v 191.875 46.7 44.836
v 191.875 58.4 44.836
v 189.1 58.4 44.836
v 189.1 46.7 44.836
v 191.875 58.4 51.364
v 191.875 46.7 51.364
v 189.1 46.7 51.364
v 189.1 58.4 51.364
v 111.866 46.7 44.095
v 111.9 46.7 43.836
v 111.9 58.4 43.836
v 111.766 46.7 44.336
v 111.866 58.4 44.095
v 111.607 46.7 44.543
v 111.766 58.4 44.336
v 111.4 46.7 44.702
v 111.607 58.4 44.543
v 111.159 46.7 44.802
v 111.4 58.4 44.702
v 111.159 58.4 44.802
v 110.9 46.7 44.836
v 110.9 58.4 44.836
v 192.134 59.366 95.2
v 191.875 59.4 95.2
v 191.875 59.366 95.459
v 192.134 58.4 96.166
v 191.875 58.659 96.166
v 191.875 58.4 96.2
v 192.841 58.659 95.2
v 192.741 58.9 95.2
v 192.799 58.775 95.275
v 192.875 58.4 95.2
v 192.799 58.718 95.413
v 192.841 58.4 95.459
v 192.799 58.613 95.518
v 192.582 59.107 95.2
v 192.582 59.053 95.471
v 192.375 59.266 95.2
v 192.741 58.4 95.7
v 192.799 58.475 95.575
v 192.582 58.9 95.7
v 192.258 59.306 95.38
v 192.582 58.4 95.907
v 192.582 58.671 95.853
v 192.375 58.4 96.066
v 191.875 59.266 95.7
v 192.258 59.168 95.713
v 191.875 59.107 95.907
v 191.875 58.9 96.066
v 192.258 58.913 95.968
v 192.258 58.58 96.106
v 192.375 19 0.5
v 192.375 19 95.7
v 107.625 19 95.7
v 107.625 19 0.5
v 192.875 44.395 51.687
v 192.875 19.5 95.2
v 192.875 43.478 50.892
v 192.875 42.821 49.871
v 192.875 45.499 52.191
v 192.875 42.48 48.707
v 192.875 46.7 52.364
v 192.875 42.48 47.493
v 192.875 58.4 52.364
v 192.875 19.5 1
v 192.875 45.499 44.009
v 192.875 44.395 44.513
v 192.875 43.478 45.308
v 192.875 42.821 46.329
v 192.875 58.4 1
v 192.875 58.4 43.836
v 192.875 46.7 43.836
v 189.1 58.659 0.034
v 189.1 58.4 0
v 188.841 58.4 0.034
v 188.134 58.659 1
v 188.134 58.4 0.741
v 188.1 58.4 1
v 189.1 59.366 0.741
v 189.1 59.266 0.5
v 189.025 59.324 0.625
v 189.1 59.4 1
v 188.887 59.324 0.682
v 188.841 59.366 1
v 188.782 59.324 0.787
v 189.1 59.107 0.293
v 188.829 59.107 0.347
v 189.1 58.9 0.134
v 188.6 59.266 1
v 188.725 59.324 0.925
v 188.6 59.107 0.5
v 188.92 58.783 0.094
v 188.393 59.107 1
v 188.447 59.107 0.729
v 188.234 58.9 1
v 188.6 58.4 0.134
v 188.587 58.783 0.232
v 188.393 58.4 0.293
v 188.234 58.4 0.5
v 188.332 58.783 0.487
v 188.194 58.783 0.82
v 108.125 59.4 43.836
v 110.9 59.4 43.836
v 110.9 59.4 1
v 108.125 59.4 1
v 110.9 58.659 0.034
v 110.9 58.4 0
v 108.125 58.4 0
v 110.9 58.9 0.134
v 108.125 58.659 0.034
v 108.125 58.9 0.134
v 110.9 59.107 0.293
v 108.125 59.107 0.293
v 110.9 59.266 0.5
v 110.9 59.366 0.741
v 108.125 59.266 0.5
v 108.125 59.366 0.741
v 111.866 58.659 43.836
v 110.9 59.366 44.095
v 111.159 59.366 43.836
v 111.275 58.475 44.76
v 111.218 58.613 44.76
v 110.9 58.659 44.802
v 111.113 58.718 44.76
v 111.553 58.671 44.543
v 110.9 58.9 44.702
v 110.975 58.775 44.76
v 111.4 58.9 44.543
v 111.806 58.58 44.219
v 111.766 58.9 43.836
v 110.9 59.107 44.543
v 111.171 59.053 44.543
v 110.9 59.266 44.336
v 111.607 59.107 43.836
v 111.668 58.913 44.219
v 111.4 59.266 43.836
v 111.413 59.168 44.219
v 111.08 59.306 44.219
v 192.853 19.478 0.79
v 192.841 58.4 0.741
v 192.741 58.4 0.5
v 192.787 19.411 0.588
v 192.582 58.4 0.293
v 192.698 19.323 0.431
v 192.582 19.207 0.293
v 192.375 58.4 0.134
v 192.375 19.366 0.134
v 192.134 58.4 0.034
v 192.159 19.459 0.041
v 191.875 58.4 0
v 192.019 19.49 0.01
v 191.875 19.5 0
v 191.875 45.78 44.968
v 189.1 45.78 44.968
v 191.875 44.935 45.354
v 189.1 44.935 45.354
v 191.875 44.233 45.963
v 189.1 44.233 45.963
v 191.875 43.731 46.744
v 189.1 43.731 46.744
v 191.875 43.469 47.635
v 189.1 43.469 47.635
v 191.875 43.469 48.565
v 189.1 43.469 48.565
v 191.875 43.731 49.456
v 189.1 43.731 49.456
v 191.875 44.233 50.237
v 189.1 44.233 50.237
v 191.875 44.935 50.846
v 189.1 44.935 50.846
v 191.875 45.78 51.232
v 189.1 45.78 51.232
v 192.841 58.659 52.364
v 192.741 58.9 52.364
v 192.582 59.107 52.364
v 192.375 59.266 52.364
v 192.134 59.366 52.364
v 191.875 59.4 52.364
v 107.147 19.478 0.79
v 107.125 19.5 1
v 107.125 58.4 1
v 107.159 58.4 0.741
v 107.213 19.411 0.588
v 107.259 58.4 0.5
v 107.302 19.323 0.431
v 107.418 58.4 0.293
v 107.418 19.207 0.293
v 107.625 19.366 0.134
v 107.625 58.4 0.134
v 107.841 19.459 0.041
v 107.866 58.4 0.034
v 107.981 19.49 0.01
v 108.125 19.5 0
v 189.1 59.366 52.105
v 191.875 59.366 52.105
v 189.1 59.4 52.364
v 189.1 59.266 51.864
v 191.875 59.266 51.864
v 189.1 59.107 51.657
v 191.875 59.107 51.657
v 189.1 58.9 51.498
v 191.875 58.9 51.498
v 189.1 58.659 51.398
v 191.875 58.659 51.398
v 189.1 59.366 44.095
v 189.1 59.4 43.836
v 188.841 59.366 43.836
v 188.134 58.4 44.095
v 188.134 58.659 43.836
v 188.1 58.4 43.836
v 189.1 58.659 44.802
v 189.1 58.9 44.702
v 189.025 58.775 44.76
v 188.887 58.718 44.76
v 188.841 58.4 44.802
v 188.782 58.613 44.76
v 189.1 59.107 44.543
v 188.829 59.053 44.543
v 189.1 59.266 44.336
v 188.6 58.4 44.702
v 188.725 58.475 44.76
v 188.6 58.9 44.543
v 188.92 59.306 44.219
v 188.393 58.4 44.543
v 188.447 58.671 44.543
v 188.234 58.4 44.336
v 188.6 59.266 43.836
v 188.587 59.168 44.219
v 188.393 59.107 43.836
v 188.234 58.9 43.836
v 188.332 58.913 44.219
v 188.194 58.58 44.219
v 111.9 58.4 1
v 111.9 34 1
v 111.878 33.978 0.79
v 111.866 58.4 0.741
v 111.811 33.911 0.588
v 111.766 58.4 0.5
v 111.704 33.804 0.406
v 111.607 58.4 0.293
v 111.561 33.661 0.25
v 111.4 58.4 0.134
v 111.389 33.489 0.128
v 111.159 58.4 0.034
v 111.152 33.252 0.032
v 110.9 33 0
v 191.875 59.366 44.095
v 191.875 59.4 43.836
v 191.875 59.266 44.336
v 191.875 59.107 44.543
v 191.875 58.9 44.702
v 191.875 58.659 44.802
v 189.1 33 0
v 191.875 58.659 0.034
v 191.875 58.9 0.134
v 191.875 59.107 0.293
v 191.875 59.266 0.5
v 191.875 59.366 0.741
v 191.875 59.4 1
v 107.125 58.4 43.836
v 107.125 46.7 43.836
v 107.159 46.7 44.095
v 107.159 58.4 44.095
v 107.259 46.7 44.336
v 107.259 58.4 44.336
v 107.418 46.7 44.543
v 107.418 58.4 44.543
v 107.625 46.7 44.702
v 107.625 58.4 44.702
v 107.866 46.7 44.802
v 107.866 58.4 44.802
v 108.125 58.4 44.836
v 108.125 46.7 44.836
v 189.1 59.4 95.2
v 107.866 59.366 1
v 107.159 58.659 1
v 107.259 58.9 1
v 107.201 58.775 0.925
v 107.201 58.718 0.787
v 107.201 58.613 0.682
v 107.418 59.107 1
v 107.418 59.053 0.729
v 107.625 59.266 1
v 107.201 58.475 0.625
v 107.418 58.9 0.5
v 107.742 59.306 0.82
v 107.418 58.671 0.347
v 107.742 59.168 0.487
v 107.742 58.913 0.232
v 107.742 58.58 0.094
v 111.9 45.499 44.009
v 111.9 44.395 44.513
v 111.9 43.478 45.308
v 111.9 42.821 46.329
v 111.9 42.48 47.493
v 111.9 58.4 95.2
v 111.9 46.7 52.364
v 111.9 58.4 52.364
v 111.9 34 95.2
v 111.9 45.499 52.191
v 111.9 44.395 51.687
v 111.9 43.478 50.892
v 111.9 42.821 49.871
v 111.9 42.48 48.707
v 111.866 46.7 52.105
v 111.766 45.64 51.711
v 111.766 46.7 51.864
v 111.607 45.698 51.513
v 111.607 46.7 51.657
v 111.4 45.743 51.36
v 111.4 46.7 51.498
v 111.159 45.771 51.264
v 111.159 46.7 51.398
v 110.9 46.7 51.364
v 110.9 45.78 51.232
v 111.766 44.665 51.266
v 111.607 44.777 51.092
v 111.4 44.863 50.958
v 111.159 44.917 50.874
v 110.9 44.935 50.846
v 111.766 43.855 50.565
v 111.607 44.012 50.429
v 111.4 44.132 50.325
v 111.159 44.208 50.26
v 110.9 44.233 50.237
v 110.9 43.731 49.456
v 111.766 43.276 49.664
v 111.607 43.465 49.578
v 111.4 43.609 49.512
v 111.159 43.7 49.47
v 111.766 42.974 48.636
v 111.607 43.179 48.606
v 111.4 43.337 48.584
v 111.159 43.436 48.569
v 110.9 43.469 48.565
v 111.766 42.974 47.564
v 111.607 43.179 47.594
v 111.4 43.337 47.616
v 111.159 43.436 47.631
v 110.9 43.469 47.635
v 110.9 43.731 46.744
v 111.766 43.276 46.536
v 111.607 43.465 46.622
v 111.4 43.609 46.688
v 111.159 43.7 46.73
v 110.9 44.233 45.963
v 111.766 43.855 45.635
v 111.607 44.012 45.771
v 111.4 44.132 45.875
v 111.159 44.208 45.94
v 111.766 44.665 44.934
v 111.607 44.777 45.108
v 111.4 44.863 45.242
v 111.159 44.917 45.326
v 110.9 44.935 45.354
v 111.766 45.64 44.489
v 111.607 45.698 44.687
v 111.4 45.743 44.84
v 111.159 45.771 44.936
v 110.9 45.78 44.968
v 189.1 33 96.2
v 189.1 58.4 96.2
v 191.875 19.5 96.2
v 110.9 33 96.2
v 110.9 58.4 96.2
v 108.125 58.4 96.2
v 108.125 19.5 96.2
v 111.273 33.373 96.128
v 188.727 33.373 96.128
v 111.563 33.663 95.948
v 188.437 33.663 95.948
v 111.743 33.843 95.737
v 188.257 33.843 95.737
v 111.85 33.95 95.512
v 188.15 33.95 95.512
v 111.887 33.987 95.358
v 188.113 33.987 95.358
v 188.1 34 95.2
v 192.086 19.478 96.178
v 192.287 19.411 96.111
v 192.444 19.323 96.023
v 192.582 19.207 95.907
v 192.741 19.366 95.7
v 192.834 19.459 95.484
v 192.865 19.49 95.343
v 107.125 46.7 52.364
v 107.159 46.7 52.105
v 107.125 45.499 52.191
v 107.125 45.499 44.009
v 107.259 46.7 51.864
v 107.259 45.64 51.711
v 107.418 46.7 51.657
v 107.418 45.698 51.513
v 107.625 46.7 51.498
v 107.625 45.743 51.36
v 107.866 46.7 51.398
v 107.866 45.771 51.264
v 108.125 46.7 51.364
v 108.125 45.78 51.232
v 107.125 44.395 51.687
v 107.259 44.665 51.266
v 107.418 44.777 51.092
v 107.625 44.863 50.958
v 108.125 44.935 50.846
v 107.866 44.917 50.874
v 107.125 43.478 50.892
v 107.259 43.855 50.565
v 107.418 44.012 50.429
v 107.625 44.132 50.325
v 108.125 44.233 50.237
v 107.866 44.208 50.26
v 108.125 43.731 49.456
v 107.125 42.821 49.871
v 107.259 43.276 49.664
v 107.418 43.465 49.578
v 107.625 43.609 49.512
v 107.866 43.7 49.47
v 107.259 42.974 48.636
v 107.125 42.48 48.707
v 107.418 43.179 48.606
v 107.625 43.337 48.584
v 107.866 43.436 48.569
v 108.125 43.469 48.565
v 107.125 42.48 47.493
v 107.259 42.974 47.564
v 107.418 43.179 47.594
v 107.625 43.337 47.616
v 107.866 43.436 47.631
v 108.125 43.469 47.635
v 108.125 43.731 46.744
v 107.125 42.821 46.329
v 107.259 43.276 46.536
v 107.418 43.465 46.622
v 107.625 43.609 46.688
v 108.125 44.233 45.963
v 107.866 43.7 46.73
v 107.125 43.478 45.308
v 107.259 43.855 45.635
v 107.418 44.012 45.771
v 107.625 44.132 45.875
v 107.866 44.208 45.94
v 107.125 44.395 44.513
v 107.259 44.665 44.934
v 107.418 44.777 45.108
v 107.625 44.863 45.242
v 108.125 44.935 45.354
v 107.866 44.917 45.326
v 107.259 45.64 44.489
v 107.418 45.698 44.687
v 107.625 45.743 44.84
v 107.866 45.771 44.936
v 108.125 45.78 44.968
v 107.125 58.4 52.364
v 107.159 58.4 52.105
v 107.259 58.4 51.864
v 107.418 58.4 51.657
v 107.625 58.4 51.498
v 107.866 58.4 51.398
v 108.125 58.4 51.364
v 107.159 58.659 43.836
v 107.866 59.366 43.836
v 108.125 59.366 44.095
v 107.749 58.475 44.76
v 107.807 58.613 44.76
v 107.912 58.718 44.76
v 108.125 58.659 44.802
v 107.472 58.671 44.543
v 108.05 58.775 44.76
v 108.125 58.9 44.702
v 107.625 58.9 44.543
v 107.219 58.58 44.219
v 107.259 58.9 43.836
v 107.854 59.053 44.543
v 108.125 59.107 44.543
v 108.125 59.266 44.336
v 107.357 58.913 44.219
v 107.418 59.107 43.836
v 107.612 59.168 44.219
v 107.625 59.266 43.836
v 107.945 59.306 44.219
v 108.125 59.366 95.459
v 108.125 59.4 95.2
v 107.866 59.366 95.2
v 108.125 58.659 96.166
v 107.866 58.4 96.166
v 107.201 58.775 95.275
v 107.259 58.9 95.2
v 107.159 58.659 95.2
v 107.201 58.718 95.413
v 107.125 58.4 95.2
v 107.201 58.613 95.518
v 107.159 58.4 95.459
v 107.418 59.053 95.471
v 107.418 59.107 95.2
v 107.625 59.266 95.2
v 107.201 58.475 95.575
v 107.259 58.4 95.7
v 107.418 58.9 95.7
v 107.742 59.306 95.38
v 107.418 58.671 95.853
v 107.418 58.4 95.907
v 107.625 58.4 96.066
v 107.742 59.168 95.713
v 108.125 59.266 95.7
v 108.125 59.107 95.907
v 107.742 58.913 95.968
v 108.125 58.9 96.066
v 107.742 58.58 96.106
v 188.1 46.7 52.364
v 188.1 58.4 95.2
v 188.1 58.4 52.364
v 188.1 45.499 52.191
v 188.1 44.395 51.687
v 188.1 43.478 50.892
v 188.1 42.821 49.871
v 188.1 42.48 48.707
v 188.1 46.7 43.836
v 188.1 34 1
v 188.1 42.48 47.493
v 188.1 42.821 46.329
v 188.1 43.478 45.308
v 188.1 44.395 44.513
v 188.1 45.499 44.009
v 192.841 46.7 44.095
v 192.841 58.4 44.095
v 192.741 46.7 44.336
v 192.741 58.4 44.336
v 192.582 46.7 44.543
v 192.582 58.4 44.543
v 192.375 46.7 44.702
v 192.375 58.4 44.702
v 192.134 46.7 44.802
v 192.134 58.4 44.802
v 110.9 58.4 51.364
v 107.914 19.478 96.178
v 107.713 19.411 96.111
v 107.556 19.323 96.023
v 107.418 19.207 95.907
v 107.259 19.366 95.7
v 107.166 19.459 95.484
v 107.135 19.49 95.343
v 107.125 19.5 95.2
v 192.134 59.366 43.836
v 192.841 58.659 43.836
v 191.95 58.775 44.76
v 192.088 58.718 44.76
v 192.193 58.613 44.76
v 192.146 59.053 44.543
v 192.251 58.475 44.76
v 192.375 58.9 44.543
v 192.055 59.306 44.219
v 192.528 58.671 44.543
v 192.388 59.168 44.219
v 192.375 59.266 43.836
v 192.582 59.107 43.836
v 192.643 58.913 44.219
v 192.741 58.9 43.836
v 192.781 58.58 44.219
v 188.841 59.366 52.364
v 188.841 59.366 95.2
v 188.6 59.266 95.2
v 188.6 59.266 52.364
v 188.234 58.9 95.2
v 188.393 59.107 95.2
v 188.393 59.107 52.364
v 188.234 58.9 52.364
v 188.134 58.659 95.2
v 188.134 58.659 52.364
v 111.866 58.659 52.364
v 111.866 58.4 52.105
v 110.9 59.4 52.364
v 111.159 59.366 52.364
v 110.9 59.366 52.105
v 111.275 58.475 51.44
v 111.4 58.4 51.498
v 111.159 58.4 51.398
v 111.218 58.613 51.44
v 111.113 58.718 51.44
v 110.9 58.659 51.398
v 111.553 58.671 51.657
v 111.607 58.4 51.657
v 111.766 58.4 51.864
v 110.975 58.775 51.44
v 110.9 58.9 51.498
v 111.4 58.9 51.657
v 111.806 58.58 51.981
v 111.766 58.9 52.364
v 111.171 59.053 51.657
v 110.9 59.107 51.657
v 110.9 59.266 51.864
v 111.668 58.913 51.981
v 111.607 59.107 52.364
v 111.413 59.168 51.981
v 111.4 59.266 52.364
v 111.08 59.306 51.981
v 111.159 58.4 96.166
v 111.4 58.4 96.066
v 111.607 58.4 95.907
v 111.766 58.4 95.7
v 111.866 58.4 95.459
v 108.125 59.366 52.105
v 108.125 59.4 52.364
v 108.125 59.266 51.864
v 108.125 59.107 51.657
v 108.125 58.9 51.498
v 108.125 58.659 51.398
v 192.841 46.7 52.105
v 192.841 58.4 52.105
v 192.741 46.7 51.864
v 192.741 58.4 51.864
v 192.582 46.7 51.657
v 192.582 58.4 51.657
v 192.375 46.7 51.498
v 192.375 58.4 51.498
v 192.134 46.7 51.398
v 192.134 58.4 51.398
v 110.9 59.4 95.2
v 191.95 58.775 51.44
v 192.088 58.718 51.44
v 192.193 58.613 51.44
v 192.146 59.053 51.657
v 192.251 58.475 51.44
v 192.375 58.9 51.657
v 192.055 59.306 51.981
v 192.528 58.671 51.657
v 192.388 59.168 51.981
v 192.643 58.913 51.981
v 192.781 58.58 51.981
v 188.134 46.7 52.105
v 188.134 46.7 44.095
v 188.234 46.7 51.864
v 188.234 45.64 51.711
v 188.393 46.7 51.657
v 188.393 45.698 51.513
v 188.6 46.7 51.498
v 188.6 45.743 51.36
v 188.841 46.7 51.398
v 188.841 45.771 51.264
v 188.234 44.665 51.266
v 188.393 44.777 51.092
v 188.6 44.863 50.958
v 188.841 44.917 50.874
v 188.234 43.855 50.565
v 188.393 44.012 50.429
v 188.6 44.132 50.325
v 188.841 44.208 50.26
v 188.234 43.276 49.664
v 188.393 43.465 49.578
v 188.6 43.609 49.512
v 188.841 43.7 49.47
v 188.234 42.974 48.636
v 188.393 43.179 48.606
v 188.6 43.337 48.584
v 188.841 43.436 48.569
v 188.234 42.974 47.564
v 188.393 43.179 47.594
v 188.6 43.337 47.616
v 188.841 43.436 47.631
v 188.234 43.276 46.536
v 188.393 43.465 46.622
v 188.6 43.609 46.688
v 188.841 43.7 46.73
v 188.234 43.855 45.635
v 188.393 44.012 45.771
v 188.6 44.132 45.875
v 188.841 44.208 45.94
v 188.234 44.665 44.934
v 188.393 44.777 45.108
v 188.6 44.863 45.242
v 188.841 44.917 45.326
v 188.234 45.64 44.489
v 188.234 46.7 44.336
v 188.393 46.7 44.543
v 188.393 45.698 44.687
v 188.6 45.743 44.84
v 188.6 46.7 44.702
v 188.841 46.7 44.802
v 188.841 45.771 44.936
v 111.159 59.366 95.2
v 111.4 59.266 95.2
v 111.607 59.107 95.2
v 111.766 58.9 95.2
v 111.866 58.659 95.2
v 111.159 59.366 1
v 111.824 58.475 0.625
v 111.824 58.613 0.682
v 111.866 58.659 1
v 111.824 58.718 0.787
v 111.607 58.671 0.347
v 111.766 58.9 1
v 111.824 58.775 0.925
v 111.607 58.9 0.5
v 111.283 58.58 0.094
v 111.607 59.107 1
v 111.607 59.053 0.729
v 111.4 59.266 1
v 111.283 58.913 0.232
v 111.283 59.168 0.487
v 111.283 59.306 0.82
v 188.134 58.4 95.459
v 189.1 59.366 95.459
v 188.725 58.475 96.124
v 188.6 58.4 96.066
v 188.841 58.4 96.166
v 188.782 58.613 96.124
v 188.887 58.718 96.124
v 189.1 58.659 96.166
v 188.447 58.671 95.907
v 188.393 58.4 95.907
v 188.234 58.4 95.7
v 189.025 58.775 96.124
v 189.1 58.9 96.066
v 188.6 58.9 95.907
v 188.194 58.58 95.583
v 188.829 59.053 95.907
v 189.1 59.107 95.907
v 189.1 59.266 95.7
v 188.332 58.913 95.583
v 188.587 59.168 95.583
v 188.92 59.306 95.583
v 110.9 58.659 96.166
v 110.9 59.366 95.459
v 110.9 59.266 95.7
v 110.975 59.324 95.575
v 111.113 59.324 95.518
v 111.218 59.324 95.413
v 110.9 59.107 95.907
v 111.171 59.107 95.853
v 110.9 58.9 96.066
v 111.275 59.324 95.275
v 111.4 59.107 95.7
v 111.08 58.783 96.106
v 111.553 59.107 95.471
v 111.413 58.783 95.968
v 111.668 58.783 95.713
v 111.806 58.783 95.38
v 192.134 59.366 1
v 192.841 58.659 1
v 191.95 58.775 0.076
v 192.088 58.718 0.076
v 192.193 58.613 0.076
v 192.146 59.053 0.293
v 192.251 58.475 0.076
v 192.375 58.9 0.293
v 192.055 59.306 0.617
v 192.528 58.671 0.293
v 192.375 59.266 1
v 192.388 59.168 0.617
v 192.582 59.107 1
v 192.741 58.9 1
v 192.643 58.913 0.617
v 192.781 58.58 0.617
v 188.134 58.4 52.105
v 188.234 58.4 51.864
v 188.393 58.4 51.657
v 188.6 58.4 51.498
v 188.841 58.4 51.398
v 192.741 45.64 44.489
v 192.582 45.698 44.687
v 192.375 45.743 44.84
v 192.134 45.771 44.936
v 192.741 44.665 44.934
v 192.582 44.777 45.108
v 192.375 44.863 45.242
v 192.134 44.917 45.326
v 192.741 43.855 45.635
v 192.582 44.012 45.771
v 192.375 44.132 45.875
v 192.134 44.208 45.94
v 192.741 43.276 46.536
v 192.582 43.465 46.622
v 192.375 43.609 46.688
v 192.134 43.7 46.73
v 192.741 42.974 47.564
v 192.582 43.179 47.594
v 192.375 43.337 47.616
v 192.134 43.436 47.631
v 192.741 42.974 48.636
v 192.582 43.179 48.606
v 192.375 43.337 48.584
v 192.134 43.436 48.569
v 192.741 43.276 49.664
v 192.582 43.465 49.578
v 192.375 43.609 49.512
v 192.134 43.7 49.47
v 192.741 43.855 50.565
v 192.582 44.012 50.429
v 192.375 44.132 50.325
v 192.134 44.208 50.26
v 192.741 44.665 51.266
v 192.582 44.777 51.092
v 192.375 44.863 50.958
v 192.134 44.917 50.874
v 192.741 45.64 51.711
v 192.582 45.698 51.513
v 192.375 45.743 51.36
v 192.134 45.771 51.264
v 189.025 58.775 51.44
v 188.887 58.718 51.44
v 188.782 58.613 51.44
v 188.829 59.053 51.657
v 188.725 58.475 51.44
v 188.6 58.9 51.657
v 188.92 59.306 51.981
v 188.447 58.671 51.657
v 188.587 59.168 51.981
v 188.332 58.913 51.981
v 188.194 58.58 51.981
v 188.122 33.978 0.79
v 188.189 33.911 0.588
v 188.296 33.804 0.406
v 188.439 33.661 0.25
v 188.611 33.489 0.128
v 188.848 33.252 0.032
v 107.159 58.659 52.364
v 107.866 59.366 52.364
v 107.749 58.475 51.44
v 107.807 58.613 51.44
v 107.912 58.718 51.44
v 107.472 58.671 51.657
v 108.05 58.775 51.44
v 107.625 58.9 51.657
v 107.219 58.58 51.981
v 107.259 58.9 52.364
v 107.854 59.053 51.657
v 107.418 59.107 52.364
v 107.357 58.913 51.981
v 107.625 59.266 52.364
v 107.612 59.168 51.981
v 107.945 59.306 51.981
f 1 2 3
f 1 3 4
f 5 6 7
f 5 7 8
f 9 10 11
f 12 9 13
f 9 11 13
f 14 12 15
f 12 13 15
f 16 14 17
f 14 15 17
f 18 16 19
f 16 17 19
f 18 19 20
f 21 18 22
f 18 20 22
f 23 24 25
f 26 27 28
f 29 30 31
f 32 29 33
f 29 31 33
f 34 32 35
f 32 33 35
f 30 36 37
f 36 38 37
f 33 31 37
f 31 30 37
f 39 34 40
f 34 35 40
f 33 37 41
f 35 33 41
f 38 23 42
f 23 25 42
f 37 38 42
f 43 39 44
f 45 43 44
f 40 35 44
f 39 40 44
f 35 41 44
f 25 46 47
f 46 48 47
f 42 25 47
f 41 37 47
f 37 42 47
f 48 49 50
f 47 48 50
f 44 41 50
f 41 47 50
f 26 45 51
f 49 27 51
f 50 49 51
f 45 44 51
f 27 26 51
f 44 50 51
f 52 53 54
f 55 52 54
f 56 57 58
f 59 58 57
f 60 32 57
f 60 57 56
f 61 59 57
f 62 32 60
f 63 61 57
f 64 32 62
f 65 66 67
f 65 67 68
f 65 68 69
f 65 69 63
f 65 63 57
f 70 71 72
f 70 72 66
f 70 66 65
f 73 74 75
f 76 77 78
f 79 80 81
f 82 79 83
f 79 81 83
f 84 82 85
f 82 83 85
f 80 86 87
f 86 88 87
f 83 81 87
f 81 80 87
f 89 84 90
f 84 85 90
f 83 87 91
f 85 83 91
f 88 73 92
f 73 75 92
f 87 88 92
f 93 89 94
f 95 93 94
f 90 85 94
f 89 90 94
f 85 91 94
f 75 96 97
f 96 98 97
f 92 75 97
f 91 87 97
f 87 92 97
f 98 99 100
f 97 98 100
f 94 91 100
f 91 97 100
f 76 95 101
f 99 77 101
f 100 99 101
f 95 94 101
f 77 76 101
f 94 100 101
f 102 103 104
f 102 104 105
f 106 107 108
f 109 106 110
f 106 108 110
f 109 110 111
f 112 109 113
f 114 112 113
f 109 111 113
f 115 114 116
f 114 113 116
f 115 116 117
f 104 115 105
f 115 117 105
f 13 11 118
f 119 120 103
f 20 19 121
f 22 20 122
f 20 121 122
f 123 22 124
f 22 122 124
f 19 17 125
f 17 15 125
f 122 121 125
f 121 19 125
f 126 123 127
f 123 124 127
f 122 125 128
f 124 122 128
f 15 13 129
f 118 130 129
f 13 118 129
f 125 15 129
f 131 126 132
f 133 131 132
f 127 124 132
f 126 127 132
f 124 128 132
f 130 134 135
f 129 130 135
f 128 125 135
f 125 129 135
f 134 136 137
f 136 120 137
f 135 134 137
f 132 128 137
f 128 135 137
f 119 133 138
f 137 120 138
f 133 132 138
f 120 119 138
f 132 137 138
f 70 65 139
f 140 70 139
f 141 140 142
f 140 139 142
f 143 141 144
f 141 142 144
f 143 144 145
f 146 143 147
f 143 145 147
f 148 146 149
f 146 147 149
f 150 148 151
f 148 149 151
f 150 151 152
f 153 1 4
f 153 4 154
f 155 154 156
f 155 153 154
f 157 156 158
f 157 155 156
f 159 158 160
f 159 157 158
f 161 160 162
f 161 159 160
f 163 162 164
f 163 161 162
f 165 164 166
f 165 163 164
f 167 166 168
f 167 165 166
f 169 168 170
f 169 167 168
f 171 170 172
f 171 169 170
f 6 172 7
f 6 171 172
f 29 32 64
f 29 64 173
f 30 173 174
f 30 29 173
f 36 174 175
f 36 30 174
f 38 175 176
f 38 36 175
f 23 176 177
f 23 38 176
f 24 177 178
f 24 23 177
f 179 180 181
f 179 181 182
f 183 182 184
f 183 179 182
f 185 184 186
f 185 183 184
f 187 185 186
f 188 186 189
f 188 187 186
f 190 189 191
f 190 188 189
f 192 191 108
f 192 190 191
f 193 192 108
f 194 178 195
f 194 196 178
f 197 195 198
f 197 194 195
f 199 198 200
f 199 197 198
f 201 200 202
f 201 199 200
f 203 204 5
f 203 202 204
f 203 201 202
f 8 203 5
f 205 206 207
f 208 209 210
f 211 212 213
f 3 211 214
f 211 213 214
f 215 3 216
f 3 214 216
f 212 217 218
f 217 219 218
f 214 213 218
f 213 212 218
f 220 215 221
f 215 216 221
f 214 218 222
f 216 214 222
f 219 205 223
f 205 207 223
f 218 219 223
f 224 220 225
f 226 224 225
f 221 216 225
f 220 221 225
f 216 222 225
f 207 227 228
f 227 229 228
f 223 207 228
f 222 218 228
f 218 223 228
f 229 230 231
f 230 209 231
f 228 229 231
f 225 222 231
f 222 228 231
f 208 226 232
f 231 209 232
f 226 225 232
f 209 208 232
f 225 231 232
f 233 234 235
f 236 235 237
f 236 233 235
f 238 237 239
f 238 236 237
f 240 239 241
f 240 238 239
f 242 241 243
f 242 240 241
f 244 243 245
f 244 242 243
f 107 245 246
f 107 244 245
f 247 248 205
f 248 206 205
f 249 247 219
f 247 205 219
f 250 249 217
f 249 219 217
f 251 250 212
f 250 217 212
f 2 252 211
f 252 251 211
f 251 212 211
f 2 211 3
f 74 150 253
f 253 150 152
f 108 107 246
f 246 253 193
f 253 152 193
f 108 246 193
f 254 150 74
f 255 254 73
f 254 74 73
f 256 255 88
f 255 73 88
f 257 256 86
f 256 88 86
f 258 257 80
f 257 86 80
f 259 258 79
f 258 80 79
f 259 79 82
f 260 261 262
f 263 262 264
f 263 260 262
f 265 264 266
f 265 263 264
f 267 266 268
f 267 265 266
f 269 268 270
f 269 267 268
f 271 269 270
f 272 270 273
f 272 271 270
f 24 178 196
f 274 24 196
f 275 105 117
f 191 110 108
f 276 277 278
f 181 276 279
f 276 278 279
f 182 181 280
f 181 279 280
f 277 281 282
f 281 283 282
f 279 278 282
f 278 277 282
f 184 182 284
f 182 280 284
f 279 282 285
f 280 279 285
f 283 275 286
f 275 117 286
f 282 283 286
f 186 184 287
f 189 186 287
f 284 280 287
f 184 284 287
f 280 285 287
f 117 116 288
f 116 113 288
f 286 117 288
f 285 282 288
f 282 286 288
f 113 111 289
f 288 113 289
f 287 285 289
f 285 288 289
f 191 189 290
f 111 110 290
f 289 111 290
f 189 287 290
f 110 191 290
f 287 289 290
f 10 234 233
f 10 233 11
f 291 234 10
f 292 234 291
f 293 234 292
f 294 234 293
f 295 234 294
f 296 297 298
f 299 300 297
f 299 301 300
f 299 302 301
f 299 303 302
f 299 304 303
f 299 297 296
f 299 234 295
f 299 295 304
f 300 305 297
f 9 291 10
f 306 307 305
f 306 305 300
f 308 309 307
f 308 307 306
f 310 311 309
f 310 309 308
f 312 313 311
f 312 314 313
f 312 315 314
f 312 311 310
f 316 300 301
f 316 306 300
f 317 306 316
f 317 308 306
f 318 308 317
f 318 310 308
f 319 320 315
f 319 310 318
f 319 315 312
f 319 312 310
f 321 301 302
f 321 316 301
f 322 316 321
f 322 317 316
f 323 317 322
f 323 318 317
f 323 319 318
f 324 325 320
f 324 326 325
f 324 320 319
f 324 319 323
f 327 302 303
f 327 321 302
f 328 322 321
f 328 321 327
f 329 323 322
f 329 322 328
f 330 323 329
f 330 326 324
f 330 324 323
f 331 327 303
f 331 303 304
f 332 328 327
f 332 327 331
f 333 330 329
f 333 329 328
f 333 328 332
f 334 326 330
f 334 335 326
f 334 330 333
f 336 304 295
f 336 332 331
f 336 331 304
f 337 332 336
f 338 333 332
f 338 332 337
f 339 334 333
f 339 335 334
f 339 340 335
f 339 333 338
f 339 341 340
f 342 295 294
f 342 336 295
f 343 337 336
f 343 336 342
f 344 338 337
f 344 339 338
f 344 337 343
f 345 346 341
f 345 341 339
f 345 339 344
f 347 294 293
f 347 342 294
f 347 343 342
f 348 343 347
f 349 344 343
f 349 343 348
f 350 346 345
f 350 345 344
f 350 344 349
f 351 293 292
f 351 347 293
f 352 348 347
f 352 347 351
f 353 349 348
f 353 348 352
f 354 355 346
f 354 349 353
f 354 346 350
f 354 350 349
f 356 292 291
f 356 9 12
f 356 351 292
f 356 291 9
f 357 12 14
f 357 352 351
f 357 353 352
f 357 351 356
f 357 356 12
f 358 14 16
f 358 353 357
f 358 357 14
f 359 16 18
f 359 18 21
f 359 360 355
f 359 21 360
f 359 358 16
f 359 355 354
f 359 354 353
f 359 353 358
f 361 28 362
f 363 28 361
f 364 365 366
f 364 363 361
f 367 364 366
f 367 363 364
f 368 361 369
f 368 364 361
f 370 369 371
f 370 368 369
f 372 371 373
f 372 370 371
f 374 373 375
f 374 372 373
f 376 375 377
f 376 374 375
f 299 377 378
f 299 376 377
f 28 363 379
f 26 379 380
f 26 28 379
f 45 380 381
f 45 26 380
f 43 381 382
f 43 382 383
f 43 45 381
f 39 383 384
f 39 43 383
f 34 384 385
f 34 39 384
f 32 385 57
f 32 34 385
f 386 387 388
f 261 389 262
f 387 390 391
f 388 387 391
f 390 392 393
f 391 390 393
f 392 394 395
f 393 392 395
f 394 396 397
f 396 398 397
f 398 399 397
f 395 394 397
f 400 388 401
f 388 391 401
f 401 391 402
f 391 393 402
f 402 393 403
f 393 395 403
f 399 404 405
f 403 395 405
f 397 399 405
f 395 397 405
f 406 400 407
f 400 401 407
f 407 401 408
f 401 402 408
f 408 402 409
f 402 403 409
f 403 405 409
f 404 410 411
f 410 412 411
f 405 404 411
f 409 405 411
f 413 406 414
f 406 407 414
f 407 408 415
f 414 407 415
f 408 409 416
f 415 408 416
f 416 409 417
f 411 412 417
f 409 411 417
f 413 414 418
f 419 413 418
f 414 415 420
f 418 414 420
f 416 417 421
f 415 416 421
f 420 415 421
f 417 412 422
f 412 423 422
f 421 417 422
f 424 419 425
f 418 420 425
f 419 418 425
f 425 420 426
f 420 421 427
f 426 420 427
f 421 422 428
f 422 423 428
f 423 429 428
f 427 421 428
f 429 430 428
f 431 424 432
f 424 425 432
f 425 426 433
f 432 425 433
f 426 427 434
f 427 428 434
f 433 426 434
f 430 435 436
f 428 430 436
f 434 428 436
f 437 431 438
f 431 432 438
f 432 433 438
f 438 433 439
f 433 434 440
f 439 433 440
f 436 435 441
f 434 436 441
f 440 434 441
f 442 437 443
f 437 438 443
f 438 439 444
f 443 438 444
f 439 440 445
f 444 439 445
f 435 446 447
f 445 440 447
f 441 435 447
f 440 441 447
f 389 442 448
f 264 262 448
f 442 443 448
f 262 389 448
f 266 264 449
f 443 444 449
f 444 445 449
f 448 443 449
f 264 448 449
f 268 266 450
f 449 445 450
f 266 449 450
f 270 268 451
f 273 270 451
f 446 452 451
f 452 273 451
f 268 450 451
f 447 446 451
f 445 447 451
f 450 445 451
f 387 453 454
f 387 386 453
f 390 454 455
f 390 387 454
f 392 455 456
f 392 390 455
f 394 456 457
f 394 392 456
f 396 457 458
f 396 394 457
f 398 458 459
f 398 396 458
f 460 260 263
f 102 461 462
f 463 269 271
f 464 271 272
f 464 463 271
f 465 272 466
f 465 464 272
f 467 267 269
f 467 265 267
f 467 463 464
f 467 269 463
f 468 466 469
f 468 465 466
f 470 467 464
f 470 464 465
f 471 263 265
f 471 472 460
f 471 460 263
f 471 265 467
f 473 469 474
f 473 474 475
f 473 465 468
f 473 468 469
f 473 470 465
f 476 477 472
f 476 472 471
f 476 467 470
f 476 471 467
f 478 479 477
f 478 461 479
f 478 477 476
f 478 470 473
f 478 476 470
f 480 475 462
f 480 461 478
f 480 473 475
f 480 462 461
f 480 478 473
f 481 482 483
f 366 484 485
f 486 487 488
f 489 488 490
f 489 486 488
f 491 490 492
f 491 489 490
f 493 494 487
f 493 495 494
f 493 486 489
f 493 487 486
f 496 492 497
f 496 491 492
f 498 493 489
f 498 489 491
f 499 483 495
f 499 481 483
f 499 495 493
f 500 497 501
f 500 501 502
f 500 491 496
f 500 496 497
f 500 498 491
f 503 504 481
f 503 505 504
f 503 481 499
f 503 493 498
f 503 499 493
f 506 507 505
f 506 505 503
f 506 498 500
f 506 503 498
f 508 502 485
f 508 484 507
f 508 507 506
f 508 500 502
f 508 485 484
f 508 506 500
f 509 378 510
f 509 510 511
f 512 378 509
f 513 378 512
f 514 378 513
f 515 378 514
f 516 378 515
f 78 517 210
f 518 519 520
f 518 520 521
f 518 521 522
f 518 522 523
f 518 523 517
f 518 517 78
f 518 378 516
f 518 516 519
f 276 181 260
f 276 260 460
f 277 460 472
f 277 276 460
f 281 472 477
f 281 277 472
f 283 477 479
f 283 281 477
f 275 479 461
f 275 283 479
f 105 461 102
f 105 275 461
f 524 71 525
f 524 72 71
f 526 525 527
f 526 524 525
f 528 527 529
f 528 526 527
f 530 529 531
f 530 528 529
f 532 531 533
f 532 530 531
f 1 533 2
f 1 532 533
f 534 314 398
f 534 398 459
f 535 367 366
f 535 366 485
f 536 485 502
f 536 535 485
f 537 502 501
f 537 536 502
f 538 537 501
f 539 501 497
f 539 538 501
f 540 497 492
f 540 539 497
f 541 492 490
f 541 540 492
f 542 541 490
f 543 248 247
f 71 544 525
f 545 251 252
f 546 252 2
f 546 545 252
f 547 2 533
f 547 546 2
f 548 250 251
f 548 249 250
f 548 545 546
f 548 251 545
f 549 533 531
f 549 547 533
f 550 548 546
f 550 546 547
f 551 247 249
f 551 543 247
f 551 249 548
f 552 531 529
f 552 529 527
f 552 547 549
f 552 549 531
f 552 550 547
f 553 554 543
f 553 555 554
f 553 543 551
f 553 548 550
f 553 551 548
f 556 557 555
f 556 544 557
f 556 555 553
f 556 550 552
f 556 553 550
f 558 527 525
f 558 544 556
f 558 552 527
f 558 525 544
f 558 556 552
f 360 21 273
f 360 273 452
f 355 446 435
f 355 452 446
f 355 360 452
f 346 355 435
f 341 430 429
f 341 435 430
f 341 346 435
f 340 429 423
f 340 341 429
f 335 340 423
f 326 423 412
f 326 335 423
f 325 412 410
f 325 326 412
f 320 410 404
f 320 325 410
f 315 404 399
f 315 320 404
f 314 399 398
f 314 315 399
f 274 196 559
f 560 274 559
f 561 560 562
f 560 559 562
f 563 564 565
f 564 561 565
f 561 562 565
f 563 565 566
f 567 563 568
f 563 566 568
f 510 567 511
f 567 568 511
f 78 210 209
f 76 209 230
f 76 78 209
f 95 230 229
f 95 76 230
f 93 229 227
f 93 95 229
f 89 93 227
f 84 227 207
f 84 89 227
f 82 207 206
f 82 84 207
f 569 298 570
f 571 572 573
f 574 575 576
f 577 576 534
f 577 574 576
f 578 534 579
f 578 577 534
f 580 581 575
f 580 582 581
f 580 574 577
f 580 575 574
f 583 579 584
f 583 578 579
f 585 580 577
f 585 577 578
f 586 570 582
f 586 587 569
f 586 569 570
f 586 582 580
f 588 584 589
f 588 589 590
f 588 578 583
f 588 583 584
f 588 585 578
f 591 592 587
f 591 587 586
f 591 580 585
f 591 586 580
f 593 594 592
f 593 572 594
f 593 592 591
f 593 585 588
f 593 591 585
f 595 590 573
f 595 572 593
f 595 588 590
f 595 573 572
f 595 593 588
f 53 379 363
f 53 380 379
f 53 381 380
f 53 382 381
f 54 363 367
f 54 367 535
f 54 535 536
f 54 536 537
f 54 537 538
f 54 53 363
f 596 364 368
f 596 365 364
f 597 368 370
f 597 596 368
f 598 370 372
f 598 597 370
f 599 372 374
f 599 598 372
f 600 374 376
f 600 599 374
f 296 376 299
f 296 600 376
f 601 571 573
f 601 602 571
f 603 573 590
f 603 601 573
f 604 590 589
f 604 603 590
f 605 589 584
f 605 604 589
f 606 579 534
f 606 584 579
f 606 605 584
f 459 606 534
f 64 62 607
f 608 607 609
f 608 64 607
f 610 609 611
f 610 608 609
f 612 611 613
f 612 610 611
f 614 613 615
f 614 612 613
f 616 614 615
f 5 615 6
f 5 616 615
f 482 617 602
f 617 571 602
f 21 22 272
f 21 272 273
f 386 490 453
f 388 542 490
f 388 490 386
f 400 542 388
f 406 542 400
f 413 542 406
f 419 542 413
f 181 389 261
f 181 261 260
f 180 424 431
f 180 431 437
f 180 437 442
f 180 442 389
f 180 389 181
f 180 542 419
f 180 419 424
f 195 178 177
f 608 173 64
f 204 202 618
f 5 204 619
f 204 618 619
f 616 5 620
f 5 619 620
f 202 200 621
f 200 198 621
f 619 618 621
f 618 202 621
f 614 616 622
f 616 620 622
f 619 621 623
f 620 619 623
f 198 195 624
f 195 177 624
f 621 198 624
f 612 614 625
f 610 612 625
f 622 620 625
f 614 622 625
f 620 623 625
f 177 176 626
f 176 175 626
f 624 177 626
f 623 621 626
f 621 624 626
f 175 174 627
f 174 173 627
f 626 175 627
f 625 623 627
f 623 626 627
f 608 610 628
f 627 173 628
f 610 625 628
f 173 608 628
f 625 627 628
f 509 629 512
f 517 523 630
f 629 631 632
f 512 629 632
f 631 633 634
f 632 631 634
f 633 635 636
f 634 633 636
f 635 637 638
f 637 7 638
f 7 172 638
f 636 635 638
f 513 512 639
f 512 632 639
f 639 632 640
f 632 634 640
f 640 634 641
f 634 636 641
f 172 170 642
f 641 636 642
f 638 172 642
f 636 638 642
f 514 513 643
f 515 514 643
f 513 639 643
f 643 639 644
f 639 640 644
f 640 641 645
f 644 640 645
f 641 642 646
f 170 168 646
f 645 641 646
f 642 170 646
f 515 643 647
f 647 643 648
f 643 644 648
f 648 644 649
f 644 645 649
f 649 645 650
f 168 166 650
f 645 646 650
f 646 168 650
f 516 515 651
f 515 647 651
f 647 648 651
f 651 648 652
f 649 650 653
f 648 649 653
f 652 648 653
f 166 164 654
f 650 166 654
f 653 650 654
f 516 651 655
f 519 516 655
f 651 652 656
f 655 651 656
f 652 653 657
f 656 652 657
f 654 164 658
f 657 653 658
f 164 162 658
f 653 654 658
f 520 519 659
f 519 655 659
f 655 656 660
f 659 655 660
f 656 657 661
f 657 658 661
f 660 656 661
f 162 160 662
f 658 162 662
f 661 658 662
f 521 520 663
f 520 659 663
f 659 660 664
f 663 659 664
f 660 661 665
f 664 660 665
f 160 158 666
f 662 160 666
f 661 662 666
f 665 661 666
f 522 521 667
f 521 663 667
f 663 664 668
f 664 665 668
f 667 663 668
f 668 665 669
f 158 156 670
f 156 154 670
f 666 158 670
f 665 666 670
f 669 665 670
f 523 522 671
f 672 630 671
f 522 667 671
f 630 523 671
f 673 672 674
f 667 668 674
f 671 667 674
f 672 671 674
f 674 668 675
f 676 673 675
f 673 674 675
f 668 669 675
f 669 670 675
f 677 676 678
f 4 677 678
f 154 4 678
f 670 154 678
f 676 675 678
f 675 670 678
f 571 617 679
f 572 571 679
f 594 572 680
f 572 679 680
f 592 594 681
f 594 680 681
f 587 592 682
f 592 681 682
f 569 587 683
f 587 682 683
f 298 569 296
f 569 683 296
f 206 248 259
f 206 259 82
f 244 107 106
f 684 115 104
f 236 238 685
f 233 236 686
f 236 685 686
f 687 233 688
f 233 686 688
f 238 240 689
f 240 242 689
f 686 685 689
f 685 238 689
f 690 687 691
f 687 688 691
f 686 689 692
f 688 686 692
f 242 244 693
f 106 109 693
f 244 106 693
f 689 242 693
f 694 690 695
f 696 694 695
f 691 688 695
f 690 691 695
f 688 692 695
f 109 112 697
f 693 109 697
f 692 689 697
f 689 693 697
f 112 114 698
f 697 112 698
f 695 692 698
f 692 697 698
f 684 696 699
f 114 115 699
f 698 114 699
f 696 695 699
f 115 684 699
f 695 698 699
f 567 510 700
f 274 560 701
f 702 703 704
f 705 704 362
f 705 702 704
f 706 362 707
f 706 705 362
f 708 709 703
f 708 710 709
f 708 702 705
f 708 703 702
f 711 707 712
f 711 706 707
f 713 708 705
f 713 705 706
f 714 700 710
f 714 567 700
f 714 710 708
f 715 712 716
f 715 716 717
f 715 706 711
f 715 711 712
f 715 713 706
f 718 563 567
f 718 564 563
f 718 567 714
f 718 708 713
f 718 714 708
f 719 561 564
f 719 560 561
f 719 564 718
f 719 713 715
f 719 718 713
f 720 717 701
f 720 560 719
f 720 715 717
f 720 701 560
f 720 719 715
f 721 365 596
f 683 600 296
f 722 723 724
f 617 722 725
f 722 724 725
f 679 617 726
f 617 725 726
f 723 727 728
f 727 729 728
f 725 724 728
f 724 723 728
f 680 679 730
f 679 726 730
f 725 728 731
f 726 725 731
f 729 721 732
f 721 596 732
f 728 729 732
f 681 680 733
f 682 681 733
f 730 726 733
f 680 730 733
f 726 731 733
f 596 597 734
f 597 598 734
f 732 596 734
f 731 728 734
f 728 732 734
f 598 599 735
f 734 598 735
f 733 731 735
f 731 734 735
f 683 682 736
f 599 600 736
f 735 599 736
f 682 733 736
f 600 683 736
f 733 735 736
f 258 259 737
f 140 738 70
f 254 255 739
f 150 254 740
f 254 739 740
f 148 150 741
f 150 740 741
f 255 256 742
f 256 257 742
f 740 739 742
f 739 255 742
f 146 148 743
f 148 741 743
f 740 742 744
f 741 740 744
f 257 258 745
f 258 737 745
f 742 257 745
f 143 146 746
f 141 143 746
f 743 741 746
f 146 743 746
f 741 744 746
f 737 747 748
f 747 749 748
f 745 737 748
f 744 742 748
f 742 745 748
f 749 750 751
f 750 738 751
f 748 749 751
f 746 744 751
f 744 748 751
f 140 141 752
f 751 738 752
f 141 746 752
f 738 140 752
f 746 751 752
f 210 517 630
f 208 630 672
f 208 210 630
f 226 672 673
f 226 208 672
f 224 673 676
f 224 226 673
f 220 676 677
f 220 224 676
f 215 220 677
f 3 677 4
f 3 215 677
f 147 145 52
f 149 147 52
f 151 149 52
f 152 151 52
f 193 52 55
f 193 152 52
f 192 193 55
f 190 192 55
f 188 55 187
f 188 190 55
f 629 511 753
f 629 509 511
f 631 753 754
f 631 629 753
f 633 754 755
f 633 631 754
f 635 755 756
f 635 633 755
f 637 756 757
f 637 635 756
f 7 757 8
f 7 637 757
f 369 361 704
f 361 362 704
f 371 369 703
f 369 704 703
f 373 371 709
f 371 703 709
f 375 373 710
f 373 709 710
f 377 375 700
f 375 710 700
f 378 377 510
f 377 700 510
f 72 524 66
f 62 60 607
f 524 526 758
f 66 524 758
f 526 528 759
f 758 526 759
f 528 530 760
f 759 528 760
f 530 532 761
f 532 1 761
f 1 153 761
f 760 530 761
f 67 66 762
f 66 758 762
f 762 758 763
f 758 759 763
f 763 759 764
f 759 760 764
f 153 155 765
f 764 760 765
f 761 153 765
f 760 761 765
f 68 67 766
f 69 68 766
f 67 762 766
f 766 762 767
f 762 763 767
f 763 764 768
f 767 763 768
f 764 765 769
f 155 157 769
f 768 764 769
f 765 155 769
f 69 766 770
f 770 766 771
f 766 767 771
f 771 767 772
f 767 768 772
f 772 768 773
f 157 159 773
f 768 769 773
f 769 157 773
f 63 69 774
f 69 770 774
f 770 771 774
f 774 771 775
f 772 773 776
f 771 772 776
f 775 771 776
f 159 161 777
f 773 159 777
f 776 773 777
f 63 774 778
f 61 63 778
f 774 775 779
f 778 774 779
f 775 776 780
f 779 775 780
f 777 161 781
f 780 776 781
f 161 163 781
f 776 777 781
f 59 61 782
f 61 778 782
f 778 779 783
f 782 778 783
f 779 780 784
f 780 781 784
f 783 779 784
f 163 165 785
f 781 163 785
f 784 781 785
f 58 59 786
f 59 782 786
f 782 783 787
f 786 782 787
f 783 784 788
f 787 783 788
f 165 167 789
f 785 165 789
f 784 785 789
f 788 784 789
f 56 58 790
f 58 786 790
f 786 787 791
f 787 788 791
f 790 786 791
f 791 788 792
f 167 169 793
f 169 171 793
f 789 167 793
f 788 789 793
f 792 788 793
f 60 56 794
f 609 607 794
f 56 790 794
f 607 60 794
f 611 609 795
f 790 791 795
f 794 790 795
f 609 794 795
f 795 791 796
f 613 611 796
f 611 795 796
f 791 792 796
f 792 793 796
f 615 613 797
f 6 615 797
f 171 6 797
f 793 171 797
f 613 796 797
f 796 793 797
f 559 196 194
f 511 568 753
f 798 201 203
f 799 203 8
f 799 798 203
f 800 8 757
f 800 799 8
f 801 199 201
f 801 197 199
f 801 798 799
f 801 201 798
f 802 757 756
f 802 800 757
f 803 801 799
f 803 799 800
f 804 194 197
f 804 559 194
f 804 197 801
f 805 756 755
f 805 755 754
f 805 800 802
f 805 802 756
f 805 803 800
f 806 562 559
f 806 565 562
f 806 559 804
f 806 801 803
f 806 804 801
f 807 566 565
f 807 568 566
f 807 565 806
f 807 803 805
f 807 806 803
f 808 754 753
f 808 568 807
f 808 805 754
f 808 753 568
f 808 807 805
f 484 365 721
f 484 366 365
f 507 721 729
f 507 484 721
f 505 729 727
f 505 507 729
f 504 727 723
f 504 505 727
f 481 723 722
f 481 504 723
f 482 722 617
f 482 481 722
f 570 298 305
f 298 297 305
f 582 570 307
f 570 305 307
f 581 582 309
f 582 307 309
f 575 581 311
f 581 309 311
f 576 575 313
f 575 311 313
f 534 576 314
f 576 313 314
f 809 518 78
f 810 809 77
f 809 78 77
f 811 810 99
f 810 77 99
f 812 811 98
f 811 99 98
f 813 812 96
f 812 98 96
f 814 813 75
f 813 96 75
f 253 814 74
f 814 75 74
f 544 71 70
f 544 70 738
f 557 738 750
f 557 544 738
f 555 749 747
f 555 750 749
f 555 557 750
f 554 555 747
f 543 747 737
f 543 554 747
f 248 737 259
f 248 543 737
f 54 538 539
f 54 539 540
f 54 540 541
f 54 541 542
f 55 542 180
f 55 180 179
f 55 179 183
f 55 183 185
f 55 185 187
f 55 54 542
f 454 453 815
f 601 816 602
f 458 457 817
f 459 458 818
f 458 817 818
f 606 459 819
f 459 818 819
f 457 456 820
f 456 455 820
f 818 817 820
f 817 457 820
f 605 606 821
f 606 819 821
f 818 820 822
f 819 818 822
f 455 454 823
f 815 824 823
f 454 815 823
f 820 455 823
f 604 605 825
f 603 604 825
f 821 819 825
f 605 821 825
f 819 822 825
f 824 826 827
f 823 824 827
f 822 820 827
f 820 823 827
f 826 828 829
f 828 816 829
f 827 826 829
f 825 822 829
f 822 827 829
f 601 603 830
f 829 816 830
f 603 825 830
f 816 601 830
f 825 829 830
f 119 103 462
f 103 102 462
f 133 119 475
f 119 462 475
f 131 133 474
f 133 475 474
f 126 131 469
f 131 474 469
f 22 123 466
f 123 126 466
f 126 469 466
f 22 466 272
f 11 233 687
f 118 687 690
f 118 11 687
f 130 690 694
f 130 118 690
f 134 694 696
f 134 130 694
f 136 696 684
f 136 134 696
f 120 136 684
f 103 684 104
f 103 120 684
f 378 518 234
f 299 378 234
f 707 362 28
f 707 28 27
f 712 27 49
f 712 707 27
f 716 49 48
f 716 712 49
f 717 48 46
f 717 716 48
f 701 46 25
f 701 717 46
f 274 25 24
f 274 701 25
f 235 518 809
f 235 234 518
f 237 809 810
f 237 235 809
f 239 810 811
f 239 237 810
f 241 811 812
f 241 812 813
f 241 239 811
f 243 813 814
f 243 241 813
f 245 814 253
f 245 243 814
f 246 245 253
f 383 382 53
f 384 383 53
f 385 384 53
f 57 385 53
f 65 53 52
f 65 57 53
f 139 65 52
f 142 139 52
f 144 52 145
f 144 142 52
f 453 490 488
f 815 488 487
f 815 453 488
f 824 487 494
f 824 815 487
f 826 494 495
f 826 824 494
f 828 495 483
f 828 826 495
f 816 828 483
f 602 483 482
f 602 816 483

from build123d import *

# Parameters (mm, degrees)
SKETCH2_W           = 85.7504
SKETCH2_H           = 96.2
BOSS_EXTRUDE1_DEPTH = 15
SKETCH2_3_W         = 4.7752
SKETCH2_3_H         = 96.2
BOSS_EXTRUDE2_DEPTH = 25.4
CUT_EXTRUDE1_DEPTH  = 142.901131427
CHAMFER1_SIZE       = 0.5
FILLET2_R           = 1


with BuildPart() as part:
    # Sketch2 → Boss-Extrude1 (new body)
    with BuildSketch(Plane(origin=(0, 34, 0), x_dir=(-1, 0, 0), z_dir=(0, -1, 0))):
        with Locations((-150, -48.1)):
            Rectangle(SKETCH2_W, SKETCH2_H)
    extrude(amount=BOSS_EXTRUDE1_DEPTH)

    # Sketch2<3> → Boss-Extrude2 (add)
    with BuildSketch(Plane(origin=(0, 34, 0), x_dir=(-1, 0, 0), z_dir=(0, -1, 0))):
        with Locations((-109.5124, -48.1)):
            Rectangle(SKETCH2_3_W, SKETCH2_3_H)
        with Locations((-190.4876, -48.1)):
            Rectangle(SKETCH2_3_W, SKETCH2_3_H)
    extrude(amount=-BOSS_EXTRUDE2_DEPTH)

    # Sketch3 → Cut-Extrude1 (cut, through all)
    with BuildSketch(Plane(origin=(192.8752, 0, 0), x_dir=(0, 0, -1), z_dir=(1, 0, 0))):
        with BuildLine():
            Line((-51.3639, 46.7), (-51.3639, 59.4))
            Line((-51.3639, 59.4), (-44.8361, 59.4))
            Line((-44.8361, 59.4), (-44.8361, 46.7))
            ThreePointArc((-44.8361, 46.7), (-48.1, 43.4361), (-51.3639, 46.7))
        make_face()
    extrude(amount=-CUT_EXTRUDE1_DEPTH, mode=Mode.SUBTRACT)

    # Chamfer1
    chamfer1_edges = [part.edges().sort_by_distance(p)[0] for p in [
        (150, 19, 96.2),
        (192.8752, 19, 48.1),
        (150, 19, 0),
        (107.1248, 19, 48.1),
    ]]
    chamfer(chamfer1_edges, length=CHAMFER1_SIZE)

    # Fillet2
    fillet2_edges = [part.edges().sort_by_distance(p)[0] for p in [
        (111.9, 53.05, 44.8361),
        (111.9, 43.4361, 48.1),
        (107.1248, 53.05, 44.8361),
        (107.1248, 43.4361, 48.1),
        (192.8752, 53.05, 44.8361),
        (192.8752, 43.4361, 48.1),
        (188.1, 53.05, 44.8361),
        (188.1, 43.4361, 48.1),
        (109.5124, 59.4, 0),
        (111.9, 59.4, 22.41805),
        (109.5124, 59.4, 44.8361),
        (107.1248, 59.4, 22.41805),
        (109.5124, 59.4, 96.2),
        (107.1248, 59.4, 73.78195),
        (111.9, 59.4, 73.78195),
        (190.4876, 59.4, 0),
        (192.8752, 59.4, 22.41805),
        (190.4876, 59.4, 44.8361),
        (188.1, 59.4, 22.41805),
        (190.4876, 59.4, 96.2),
        (188.1, 59.4, 73.78195),
        (192.8752, 59.4, 73.78195),
        (111.9, 53.05, 51.3639),
        (109.5124, 59.4, 51.3639),
        (107.1248, 53.05, 51.3639),
        (192.8752, 53.05, 51.3639),
        (190.4876, 59.4, 51.3639),
        (188.1, 53.05, 51.3639),
        (150, 34, 96.2),
        (107.1248, 39.45, 96.2),
        (188.1, 46.7, 96.2),
        (111.9, 46.7, 96.2),
        (192.8752, 39.45, 96.2),
        (107.1248, 39.45, 0),
        (192.8752, 39.45, 0),
        (188.1, 46.7, 0),
        (150, 34, 0),
        (111.9, 46.7, 0),
    ]]
    fillet(fillet2_edges, radius=FILLET2_R)


solid = part.part
